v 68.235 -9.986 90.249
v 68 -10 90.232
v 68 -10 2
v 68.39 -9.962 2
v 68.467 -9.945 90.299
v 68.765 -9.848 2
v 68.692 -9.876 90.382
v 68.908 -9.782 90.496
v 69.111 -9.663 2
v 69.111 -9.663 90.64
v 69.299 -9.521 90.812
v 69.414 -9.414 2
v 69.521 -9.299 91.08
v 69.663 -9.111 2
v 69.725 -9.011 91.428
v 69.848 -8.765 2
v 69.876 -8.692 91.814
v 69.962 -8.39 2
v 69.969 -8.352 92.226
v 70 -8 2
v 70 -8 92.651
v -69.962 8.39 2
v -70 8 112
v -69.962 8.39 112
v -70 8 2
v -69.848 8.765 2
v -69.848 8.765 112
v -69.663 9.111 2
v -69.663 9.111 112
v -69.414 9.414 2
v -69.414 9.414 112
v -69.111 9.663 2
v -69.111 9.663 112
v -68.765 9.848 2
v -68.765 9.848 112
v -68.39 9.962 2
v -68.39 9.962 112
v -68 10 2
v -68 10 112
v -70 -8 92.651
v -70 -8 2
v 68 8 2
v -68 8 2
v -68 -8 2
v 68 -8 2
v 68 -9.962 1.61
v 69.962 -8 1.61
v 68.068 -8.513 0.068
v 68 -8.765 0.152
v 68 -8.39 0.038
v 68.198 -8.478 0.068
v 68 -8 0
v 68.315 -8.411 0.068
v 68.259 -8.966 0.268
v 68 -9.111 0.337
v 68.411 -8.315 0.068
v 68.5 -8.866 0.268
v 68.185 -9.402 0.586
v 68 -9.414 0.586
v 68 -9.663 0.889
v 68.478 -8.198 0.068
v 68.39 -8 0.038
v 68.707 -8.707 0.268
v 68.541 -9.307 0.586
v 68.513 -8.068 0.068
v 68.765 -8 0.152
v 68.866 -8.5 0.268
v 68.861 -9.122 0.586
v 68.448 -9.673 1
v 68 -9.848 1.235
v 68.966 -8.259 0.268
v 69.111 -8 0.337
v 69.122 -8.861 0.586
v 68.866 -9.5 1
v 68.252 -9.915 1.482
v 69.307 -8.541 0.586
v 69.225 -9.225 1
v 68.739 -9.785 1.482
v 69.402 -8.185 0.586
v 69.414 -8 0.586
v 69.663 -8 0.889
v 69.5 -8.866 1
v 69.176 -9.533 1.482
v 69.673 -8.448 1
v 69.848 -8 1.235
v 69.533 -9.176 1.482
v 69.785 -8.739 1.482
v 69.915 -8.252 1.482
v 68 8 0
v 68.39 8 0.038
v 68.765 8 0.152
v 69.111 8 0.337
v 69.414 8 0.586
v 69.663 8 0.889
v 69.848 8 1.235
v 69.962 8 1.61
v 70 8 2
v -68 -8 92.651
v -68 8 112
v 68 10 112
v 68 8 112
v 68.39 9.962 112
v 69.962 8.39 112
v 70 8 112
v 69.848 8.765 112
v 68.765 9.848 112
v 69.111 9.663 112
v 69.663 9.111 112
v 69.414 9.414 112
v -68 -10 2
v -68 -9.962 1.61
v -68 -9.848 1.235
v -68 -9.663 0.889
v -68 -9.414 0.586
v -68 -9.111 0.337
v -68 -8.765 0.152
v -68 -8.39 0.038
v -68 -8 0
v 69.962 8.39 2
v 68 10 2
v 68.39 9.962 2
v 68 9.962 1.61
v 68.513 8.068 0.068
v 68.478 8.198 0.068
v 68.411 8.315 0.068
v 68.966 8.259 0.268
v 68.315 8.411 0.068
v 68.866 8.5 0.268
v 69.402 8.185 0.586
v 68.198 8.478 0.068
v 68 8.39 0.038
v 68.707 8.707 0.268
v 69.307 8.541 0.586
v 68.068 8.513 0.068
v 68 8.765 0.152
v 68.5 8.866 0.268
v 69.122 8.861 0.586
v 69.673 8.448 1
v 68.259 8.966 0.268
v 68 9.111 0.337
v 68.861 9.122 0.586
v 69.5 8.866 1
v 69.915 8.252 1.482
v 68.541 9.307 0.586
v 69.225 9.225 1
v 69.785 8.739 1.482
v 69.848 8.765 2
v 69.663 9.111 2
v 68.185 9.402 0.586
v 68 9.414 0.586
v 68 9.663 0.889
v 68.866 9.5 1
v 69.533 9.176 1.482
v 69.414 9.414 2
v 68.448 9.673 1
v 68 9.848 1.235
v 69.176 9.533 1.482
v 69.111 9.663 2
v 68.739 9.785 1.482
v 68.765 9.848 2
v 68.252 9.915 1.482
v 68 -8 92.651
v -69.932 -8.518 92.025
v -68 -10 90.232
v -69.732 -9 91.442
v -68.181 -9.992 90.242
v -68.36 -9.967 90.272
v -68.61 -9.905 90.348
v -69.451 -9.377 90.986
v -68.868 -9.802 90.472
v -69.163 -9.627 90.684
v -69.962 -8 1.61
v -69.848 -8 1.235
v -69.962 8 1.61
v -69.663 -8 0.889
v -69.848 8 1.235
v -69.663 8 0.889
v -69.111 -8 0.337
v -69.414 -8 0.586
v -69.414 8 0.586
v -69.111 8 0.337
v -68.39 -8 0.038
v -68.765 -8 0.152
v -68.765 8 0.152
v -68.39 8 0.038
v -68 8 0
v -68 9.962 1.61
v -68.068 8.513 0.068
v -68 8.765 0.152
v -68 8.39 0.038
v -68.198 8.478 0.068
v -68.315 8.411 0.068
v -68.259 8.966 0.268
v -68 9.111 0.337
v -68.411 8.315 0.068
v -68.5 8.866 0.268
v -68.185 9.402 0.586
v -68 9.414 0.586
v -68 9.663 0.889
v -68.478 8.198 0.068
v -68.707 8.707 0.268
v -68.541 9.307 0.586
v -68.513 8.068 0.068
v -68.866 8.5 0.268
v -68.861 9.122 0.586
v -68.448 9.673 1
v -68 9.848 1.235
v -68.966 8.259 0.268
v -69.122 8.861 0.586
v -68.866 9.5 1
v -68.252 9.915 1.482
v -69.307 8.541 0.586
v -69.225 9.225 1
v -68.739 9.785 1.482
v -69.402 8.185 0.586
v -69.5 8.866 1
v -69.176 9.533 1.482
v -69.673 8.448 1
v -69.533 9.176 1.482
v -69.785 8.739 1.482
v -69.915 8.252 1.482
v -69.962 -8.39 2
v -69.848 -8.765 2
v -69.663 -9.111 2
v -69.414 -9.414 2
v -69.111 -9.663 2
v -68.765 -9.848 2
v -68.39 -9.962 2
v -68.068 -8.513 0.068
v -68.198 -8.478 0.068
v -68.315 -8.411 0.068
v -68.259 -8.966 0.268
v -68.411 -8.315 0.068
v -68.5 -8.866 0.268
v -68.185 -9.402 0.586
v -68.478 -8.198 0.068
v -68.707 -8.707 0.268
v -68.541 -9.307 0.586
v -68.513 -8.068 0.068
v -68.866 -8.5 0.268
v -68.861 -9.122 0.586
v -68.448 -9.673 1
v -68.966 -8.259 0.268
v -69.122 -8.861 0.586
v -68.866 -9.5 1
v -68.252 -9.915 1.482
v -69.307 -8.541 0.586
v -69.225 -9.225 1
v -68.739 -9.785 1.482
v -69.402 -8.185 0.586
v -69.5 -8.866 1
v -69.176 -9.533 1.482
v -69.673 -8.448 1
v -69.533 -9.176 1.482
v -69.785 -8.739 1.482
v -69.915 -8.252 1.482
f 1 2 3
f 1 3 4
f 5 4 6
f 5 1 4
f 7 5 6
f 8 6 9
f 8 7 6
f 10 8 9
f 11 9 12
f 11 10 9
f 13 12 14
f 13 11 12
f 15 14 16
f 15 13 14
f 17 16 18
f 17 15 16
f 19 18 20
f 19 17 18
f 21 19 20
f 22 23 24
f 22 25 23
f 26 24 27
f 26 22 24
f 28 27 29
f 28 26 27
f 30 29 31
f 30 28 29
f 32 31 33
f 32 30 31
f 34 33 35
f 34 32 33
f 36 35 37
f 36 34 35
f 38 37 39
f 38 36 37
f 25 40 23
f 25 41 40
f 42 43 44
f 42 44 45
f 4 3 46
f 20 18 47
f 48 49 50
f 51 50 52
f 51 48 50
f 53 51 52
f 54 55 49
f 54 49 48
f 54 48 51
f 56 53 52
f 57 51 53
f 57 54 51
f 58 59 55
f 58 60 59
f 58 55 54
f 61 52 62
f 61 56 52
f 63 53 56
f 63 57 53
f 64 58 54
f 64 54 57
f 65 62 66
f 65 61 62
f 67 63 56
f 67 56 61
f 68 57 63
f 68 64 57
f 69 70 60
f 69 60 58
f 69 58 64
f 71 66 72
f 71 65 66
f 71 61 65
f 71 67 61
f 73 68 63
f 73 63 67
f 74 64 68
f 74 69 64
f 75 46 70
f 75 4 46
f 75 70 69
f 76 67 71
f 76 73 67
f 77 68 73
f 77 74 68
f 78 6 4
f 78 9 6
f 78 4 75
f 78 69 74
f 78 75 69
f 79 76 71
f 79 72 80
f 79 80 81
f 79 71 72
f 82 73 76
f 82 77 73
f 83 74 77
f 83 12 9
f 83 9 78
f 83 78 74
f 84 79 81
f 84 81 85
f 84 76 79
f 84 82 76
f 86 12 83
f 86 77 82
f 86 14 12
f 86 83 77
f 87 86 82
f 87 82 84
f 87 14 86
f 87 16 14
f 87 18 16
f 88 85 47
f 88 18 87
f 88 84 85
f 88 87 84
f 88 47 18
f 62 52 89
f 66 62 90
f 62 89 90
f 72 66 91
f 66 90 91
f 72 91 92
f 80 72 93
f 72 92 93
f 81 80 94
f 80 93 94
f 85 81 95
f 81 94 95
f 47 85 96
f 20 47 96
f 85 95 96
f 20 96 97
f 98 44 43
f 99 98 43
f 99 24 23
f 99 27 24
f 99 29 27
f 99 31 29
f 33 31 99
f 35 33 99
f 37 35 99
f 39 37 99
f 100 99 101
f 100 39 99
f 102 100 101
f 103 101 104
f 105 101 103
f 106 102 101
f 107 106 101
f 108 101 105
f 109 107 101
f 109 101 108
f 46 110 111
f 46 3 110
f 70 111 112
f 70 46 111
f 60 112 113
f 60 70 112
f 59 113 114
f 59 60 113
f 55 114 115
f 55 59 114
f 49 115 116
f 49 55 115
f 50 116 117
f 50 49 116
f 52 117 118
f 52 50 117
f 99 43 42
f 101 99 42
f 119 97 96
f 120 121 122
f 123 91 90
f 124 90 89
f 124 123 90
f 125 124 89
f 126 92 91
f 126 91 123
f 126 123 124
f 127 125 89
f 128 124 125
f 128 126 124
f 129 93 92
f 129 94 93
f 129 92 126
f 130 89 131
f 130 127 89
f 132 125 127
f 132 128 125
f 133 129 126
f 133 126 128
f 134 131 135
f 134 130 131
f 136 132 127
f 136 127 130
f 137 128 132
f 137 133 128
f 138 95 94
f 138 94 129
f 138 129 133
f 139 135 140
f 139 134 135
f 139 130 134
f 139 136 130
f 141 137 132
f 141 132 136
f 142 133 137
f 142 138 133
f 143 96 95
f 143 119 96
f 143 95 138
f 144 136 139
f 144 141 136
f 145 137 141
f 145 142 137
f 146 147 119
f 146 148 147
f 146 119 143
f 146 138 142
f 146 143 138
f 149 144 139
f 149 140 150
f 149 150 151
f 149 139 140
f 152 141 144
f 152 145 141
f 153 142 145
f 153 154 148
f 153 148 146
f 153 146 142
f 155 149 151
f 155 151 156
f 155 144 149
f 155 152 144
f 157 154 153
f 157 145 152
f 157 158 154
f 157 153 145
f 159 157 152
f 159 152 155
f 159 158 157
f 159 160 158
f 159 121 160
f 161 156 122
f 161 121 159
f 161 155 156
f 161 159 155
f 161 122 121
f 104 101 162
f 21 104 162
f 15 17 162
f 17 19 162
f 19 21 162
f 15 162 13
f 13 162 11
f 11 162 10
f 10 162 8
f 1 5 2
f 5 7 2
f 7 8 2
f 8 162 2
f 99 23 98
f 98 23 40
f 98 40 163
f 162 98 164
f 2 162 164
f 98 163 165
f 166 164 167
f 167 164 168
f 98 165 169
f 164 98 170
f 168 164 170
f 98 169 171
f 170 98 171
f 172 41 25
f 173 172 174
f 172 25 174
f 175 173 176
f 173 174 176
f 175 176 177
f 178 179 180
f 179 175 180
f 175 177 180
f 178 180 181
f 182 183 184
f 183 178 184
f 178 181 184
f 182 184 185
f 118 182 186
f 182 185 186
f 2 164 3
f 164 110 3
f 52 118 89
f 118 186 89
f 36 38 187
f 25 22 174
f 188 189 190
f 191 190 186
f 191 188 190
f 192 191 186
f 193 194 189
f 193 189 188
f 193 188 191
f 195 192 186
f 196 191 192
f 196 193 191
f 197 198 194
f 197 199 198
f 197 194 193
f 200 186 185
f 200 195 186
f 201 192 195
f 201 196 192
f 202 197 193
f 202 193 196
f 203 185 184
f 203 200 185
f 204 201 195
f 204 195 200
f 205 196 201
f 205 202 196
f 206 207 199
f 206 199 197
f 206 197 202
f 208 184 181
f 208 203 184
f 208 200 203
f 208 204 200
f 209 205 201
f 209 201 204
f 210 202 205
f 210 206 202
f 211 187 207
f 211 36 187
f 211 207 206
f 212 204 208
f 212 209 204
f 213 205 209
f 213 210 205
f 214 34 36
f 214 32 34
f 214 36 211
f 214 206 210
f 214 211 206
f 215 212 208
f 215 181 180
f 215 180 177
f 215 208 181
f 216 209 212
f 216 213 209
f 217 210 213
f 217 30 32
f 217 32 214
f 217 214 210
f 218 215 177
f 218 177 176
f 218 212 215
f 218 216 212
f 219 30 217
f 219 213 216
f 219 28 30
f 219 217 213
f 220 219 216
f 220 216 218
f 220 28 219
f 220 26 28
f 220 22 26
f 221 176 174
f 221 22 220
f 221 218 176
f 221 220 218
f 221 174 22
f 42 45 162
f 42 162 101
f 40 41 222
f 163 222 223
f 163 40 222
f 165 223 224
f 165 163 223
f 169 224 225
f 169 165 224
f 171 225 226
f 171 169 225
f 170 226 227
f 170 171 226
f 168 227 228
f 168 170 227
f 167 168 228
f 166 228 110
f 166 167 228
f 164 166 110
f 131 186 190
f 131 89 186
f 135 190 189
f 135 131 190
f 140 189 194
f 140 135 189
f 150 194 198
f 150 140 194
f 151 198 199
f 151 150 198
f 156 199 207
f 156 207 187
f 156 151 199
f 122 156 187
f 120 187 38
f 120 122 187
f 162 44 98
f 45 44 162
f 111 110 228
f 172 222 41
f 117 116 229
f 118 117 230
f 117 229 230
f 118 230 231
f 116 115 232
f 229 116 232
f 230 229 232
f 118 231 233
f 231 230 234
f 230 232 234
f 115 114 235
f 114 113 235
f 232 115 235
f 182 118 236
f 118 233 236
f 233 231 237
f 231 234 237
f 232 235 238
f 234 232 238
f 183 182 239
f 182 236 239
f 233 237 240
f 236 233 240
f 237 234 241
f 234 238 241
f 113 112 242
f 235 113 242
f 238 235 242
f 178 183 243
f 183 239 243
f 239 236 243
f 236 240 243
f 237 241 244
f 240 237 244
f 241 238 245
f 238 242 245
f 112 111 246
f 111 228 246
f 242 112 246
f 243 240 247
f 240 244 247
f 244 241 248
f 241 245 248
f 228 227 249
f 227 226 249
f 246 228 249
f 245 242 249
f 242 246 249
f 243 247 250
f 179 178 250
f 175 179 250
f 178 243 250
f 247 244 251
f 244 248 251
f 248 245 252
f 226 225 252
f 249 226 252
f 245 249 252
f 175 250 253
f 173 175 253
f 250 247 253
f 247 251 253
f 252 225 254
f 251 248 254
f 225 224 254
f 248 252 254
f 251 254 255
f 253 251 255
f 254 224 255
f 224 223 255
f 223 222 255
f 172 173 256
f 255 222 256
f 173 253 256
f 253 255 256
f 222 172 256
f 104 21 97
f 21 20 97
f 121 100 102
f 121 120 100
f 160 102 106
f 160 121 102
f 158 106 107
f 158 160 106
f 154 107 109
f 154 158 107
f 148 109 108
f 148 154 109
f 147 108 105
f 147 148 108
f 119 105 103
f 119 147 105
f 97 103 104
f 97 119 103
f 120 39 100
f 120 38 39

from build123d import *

# Parameters (mm, degrees)
F0_W     = 140
F0_H     = 20
F1_DEPTH = 2
F2_W     = 140
F2_H     = 20
F2_W_2   = 136
F2_H_2   = 16
F3_DEPTH = 110
F5_DEPTH = 160
F6_R     = 2


with BuildPart() as f1:
    # F0 (on Top) → F1 (new body)
    with BuildSketch(Plane.XY):
        Rectangle(F0_W, F0_H)
    extrude(amount=F1_DEPTH)

    # F2 (on face) → F3 (join)
    with BuildSketch(Plane.XY.offset(2)):
        Rectangle(F2_W, F2_H)
        Rectangle(F2_W_2, F2_H_2, mode=Mode.SUBTRACT)
    extrude(amount=F3_DEPTH)

    # F4 (on face) → F5 (cut)
    with BuildSketch(Plane(origin=(-70, 0, 0), x_dir=(0, -1, 0), z_dir=(-1, 0, 0))):
        Polygon((10, 112), (-8, 112), (10, 90.232462), align=None)
    extrude(amount=-F5_DEPTH, mode=Mode.SUBTRACT)

    # F6
    f6_edges = [f1.edges().sort_by_distance(p)[0] for p in [
        (-70, -10, 45.116231),
        (70, -10, 45.116231),
        (-70, 10, 56),
        (70, 10, 56),
        (0, -10, 0),
        (70, 0, 0),
        (0, 10, 0),
        (-70, 0, 0),
    ]]
    fillet(f6_edges, radius=F6_R)


solid = f1.part
